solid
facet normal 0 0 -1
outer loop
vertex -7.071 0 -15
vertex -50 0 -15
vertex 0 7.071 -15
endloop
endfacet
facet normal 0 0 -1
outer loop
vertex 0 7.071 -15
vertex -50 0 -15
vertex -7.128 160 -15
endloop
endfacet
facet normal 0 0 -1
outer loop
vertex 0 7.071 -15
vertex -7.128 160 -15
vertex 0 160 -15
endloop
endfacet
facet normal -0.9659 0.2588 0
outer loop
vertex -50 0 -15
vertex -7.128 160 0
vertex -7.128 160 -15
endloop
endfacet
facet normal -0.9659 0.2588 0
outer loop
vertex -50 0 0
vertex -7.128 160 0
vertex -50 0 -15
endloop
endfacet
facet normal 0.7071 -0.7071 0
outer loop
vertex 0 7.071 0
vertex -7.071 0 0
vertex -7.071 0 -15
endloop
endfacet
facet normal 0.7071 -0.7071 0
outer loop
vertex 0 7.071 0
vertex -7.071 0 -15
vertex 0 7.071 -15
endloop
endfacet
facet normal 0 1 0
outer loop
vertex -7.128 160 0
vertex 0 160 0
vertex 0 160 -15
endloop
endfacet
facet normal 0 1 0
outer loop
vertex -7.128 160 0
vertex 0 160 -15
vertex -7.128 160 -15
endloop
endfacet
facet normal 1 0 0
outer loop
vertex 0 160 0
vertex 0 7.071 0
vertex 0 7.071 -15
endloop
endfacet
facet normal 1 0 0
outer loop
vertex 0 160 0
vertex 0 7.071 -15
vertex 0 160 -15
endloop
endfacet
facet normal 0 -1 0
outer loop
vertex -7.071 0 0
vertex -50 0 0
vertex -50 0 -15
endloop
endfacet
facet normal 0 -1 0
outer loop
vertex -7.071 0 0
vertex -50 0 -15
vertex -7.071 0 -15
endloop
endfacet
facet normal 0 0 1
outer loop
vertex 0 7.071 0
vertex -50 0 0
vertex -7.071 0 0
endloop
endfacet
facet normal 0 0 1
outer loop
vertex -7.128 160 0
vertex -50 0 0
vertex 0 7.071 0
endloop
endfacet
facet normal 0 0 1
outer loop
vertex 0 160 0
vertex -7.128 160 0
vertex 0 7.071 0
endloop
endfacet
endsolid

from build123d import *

# Parameters (mm, degrees)
BOSS_EXTRUDE1_DEPTH = 15


with BuildPart() as part:
    # Sketch1 → Boss-Extrude1 (new body)
    with BuildSketch(Plane.XY):
        Polygon((-50, 0), (-7.071067812, 0), (0, 7.071067812), (0, 160), (-7.128129211, 160), align=None)
    extrude(amount=-BOSS_EXTRUDE1_DEPTH)


solid = part.part
